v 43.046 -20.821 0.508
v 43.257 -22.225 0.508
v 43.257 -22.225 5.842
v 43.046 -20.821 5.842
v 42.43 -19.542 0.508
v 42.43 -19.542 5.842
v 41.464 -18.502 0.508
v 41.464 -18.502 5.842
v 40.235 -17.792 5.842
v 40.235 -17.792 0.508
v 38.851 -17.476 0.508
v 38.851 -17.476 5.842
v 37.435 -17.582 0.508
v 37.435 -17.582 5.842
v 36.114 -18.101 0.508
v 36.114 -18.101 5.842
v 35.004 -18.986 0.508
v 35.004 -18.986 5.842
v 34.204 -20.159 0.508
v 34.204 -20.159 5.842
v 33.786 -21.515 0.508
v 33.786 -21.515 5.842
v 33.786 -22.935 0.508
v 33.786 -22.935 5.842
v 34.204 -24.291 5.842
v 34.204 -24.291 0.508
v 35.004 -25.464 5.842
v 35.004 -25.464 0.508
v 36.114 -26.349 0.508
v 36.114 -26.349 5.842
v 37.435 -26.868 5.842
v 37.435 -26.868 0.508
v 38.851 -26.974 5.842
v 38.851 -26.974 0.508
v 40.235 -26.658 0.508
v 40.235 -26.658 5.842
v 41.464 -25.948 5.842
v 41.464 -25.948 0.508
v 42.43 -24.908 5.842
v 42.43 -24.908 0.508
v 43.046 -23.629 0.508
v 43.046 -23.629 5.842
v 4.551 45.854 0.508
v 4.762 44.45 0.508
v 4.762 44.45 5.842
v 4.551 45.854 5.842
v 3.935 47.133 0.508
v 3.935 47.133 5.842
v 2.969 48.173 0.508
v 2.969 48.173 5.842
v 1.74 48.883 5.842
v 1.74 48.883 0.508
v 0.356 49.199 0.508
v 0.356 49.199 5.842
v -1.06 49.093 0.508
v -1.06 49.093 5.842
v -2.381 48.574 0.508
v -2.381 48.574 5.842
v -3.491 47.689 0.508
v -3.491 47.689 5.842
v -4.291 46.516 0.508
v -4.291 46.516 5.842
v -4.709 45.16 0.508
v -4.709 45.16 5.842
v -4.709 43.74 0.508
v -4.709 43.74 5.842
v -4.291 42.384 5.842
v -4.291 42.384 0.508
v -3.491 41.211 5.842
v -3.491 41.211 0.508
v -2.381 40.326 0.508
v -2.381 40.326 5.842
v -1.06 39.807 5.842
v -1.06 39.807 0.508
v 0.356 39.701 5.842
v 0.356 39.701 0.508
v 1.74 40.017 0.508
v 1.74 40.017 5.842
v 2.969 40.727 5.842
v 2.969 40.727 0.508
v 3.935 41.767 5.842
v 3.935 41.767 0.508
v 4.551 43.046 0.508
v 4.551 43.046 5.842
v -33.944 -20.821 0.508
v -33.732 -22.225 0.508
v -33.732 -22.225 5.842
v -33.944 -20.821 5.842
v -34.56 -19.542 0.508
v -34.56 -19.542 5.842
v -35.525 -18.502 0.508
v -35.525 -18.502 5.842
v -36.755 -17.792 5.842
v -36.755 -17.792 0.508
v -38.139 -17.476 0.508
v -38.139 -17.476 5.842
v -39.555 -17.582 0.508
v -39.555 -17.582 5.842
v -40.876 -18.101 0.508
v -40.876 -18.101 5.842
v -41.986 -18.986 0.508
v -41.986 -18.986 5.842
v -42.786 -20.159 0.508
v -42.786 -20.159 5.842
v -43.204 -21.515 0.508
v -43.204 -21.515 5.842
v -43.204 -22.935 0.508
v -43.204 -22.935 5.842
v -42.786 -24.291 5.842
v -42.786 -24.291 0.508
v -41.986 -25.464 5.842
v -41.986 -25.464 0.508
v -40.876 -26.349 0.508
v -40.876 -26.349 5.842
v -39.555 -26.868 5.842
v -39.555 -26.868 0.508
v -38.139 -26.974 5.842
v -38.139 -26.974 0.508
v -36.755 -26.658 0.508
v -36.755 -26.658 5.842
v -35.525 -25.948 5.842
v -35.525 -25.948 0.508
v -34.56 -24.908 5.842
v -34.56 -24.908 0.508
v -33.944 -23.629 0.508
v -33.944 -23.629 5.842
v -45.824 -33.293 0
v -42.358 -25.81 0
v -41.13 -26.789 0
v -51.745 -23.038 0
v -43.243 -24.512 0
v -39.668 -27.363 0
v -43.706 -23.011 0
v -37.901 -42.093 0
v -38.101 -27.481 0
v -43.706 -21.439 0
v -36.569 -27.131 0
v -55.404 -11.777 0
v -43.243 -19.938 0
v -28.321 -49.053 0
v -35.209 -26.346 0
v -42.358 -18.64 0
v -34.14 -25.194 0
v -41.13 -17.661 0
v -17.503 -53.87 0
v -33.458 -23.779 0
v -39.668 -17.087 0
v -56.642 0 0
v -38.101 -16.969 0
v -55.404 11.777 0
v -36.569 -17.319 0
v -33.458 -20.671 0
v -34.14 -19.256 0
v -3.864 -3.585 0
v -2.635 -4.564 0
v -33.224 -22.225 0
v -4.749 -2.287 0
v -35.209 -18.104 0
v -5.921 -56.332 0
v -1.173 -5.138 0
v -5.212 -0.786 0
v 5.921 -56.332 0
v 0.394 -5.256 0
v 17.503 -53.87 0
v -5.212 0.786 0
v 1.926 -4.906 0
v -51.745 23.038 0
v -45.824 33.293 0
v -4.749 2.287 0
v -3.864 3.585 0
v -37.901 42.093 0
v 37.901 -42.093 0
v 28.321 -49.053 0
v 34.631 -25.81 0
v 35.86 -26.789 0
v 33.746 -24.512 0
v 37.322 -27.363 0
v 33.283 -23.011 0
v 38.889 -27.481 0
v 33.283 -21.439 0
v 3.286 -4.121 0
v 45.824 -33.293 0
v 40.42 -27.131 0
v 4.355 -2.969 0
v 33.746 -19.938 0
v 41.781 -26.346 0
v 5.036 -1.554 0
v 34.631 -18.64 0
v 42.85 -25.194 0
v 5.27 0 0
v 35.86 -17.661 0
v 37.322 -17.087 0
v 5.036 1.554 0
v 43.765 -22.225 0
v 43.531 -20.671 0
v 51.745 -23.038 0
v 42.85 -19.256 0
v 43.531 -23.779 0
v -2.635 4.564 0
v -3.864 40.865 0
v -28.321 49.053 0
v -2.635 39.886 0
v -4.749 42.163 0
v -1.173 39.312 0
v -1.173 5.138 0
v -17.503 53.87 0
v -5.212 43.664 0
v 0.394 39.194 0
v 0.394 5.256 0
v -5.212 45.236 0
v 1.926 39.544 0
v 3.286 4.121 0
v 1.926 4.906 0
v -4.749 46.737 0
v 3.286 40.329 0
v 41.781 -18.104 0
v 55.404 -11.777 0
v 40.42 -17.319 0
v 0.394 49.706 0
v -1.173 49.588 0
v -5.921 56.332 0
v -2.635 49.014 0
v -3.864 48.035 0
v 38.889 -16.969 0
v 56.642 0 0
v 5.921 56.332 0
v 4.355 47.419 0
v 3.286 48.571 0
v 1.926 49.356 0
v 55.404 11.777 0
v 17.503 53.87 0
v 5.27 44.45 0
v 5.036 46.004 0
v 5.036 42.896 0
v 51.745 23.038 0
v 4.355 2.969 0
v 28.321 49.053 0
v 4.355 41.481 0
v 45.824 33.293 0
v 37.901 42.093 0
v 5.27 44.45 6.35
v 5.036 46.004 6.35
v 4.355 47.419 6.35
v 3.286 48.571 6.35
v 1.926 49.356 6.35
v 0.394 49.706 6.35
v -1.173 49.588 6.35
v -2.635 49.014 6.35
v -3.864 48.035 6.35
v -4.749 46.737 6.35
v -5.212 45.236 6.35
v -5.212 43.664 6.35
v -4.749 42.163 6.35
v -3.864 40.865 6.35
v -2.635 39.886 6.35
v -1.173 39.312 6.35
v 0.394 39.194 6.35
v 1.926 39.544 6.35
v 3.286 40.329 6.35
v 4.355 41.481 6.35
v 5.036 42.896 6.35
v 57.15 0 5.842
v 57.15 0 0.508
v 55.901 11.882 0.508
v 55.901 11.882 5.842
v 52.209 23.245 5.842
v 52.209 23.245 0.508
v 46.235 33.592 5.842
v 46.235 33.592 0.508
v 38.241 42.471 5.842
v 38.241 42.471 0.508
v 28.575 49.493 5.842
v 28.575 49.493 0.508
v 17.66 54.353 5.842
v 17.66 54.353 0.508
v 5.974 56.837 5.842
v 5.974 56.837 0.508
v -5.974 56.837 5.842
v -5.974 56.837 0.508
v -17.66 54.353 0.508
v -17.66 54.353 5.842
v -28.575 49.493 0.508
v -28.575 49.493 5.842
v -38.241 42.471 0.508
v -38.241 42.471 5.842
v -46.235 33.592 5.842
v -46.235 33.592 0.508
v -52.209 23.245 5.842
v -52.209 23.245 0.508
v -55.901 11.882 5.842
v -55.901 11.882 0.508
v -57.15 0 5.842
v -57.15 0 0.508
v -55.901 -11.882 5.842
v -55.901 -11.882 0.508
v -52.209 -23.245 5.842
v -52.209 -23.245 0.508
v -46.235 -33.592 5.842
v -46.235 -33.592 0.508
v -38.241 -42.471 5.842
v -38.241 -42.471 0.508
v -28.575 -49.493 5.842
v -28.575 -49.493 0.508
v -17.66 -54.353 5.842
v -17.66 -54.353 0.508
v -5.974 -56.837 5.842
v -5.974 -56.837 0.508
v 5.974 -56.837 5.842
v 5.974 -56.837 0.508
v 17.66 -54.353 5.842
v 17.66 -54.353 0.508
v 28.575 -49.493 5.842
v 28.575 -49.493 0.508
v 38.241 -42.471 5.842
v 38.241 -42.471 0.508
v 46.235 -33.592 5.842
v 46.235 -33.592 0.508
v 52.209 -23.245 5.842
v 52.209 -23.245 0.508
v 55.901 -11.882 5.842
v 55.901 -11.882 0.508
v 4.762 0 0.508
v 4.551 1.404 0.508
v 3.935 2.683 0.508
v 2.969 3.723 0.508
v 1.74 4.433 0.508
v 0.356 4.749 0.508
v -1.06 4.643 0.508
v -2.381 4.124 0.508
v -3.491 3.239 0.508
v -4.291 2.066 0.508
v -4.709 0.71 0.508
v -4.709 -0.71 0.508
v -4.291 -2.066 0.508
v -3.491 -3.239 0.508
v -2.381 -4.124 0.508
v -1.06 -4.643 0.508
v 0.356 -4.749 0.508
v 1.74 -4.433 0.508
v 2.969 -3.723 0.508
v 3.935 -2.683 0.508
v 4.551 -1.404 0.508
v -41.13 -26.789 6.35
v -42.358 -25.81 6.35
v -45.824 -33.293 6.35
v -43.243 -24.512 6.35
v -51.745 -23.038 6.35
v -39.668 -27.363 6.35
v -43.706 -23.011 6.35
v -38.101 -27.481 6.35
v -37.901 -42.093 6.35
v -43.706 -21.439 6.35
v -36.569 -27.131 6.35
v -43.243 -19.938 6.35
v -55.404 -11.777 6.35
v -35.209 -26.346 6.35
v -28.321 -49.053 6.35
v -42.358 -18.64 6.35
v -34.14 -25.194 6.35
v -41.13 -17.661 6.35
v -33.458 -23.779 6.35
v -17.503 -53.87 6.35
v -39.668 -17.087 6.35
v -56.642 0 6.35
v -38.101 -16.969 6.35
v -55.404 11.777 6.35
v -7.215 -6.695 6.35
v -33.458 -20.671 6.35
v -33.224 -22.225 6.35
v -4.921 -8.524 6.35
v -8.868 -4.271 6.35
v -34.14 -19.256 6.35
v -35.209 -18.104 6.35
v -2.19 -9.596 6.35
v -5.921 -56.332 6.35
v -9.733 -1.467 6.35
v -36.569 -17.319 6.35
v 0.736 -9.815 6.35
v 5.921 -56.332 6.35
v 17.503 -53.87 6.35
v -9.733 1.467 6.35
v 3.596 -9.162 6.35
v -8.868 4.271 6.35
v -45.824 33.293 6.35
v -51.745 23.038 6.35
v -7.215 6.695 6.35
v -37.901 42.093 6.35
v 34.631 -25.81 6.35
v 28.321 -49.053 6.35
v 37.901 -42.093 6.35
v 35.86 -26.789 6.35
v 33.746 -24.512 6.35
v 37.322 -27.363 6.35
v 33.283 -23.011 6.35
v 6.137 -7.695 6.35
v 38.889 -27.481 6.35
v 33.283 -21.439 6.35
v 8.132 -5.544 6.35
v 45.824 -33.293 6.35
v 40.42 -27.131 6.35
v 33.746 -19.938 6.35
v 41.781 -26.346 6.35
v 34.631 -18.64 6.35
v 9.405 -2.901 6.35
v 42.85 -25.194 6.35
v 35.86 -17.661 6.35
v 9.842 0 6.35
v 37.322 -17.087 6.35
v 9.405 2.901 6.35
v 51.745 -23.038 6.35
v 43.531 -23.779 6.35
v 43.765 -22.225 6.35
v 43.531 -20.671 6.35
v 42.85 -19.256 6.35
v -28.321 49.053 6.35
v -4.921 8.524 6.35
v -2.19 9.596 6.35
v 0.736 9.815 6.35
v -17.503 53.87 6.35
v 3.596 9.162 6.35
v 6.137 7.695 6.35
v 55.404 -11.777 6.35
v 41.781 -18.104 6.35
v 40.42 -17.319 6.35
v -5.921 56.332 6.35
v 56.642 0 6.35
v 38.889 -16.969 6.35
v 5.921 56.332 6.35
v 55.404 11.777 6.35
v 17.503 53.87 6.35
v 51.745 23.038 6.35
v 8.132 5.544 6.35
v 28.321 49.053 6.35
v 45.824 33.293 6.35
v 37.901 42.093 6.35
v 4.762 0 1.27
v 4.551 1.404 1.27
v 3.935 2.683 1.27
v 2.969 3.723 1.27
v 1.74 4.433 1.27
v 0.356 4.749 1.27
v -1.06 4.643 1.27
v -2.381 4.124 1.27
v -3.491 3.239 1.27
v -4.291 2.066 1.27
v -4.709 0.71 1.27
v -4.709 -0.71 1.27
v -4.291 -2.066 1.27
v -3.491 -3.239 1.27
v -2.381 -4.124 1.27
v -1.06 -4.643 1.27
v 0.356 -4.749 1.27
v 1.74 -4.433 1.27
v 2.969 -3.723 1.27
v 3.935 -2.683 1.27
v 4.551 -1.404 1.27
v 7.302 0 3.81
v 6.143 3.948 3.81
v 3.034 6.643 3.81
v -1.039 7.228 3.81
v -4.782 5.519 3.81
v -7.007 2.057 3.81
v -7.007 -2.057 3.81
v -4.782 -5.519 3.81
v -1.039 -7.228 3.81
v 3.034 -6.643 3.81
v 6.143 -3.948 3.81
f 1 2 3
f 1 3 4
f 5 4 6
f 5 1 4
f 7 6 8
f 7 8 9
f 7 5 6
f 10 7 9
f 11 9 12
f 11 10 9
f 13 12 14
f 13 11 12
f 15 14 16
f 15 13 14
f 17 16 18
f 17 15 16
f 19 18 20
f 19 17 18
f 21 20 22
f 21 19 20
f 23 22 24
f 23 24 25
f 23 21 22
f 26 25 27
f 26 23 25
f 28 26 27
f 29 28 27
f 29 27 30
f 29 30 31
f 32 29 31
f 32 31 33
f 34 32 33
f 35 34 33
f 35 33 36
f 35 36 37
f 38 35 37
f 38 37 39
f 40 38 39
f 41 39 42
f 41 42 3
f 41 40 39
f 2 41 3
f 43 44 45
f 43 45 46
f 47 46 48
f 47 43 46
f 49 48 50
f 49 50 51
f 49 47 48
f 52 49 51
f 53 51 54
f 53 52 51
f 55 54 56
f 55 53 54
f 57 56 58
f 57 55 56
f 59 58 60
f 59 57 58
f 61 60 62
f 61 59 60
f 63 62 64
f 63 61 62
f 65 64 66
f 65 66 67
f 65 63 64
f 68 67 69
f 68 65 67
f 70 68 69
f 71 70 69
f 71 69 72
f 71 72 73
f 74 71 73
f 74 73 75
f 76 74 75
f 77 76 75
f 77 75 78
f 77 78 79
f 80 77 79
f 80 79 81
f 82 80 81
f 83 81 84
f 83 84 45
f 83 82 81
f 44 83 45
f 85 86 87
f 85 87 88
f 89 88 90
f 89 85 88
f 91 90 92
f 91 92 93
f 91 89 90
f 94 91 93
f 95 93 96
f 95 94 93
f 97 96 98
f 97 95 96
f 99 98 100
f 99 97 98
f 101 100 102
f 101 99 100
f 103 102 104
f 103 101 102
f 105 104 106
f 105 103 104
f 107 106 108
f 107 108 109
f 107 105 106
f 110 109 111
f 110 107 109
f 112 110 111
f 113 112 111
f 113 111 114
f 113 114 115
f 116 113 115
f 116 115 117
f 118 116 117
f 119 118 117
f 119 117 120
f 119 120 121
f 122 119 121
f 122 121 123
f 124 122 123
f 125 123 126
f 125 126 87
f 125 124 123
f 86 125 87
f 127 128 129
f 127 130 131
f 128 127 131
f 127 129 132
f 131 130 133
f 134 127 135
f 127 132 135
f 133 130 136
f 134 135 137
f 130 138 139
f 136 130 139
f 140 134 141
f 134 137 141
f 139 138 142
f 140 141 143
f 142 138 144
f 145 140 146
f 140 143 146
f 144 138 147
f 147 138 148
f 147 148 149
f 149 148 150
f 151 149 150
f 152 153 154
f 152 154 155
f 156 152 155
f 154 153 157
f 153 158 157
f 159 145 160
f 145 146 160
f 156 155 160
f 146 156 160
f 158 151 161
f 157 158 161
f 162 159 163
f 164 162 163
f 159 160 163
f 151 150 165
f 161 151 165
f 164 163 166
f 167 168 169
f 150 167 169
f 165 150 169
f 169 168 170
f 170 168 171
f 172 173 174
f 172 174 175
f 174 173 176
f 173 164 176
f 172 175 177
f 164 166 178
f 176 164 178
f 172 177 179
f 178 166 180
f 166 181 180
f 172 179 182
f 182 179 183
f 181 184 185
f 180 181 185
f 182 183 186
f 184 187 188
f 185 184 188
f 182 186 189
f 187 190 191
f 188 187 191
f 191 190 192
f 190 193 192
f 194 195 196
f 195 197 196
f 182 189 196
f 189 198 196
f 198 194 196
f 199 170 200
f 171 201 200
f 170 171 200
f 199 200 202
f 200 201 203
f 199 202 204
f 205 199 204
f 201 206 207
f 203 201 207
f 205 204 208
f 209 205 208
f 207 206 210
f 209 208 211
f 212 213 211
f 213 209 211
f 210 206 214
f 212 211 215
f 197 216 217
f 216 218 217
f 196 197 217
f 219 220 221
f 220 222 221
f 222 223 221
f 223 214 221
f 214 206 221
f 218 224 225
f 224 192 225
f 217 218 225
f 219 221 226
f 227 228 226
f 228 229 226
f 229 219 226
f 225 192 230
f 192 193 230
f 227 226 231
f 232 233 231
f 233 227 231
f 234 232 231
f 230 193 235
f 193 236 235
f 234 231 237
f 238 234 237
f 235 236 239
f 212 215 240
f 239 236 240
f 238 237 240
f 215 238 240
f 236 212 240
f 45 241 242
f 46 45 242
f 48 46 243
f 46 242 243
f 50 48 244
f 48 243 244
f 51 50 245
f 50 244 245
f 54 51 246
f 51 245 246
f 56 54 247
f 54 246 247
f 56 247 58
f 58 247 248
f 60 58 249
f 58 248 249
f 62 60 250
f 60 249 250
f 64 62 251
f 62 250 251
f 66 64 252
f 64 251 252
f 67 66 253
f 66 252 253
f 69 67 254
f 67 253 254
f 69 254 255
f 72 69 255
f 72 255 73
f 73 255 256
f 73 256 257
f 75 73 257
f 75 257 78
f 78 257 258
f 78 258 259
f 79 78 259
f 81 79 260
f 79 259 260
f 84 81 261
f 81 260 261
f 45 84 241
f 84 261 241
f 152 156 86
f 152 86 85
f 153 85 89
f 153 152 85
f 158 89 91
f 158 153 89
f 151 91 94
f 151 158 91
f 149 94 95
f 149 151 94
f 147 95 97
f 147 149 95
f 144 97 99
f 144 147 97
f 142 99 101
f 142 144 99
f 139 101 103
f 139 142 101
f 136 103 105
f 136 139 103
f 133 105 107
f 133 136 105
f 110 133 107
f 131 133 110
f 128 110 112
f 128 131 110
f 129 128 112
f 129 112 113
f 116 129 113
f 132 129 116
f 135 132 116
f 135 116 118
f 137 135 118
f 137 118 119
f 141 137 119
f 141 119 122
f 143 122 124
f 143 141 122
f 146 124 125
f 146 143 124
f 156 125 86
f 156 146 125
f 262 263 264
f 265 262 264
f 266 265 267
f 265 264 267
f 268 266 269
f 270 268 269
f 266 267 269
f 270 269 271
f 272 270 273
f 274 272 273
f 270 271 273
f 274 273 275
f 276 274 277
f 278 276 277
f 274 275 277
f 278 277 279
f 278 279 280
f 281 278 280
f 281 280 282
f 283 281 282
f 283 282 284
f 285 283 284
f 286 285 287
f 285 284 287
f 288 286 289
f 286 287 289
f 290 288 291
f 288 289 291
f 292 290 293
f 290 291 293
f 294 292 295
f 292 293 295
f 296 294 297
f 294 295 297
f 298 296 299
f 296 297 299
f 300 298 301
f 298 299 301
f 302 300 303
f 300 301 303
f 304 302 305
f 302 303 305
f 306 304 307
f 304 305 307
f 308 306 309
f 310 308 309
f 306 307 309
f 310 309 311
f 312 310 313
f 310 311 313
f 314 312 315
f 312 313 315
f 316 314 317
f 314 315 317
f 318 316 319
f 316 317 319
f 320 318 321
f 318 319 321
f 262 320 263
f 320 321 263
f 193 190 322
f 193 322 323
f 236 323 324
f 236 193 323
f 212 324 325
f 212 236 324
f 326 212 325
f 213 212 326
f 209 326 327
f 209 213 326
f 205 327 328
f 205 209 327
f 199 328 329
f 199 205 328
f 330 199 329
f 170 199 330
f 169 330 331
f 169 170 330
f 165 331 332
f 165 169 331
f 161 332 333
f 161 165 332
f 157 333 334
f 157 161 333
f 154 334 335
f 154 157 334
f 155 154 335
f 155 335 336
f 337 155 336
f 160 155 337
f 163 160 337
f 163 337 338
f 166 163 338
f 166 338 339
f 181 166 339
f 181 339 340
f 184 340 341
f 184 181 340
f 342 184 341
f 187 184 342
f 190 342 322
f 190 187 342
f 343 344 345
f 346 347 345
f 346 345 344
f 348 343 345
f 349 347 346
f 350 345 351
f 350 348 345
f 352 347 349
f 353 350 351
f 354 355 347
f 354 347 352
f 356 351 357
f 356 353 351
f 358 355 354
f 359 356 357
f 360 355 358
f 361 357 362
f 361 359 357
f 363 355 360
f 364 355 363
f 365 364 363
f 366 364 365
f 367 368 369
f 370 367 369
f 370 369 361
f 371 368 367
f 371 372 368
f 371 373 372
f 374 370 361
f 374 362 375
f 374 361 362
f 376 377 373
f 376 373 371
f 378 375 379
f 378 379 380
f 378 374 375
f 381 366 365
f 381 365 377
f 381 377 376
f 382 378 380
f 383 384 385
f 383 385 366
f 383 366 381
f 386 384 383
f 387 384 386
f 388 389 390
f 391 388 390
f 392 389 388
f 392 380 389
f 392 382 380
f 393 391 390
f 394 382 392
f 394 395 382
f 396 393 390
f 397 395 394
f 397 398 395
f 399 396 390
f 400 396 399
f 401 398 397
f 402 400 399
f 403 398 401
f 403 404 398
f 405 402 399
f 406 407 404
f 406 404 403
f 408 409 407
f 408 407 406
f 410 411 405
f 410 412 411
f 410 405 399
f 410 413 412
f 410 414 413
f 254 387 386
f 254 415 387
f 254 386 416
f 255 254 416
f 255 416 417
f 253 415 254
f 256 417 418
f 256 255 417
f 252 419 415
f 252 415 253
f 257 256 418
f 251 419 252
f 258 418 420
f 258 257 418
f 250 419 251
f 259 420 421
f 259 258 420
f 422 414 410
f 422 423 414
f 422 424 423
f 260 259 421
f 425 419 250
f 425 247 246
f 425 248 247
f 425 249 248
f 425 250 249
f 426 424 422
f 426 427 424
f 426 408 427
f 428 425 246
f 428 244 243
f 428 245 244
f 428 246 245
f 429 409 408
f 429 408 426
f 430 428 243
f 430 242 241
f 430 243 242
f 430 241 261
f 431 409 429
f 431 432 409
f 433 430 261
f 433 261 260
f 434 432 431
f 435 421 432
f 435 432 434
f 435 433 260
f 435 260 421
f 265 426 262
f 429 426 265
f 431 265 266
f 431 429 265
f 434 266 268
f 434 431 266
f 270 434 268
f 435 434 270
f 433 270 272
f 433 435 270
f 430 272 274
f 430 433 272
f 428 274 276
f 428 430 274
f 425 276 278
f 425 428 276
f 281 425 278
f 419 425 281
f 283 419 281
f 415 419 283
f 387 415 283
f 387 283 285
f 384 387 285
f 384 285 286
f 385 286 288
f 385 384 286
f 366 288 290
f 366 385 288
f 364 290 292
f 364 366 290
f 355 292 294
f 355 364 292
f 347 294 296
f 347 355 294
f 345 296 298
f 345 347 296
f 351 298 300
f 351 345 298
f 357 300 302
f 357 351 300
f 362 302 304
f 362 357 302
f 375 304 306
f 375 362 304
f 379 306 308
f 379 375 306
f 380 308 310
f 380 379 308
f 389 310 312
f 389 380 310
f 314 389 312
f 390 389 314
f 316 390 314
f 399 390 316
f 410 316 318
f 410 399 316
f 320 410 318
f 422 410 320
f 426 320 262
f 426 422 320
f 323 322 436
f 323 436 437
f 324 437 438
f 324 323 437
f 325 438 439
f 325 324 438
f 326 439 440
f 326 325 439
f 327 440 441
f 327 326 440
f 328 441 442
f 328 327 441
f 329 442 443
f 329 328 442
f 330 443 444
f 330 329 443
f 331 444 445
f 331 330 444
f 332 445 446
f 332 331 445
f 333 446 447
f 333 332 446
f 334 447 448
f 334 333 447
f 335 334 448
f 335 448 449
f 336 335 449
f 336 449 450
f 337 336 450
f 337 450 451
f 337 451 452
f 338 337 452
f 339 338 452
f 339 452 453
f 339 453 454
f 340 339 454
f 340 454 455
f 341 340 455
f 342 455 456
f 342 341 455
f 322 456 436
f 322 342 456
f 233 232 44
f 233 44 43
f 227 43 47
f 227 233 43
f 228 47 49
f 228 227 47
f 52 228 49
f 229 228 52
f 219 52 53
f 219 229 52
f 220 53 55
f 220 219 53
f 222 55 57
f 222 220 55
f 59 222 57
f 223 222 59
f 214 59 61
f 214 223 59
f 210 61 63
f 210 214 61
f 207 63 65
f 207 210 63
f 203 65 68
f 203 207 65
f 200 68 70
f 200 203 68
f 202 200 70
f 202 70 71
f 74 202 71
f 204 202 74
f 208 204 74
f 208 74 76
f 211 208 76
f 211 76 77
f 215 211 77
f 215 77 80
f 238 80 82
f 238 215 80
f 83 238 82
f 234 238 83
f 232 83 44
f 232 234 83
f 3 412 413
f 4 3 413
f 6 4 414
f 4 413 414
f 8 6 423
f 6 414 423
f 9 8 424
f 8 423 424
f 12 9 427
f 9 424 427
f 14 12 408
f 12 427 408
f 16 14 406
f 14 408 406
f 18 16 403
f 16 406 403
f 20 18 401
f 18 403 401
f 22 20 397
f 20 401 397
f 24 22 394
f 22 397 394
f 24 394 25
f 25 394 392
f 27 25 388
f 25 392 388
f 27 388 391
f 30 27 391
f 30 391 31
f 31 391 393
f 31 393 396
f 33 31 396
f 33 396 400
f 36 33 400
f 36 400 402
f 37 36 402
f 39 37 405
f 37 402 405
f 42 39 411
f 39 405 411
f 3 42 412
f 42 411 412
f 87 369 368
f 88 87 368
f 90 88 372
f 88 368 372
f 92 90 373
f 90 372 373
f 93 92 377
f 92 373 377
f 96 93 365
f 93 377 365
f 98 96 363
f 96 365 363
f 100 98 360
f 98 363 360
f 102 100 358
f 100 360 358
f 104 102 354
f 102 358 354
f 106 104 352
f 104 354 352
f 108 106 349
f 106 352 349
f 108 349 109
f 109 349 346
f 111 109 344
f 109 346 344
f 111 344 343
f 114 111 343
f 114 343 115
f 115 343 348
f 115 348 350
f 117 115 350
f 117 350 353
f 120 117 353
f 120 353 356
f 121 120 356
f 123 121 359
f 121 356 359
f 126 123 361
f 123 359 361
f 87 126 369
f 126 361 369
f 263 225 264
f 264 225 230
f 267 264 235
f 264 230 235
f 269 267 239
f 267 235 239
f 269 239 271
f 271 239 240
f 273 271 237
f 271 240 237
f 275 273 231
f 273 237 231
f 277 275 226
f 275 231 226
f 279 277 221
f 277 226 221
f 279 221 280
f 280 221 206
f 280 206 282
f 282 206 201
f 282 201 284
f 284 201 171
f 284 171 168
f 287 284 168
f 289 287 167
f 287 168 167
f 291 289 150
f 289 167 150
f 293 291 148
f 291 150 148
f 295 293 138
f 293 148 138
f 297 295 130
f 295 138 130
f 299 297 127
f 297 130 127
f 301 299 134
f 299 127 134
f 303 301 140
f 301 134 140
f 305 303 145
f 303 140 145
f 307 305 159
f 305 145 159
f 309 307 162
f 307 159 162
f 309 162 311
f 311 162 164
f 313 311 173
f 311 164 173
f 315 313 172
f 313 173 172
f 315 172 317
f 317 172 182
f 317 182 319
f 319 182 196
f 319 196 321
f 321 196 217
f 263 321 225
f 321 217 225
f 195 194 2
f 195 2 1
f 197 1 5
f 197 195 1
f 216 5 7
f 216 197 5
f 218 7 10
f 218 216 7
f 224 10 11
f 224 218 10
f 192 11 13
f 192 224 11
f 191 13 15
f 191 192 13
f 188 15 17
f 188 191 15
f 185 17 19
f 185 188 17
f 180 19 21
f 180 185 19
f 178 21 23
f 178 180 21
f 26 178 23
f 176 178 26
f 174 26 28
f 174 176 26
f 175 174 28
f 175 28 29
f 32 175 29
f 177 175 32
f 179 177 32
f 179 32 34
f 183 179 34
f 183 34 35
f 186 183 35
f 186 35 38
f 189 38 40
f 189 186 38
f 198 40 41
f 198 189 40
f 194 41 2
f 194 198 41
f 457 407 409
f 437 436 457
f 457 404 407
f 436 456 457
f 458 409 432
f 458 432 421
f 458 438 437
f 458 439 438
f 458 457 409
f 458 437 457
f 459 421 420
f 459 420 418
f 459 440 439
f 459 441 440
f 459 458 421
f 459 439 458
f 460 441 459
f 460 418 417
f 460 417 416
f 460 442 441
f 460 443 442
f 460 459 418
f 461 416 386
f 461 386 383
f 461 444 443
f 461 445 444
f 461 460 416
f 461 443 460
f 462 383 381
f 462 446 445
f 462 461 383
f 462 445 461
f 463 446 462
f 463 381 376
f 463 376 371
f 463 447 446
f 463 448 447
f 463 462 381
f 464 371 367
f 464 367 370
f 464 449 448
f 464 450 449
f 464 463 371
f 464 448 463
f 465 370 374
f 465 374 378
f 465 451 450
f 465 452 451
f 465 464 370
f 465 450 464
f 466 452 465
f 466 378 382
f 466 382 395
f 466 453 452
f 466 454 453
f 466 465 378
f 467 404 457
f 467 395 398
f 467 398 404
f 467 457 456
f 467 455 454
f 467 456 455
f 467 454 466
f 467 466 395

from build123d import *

# Parameters (mm, degrees)
F0_R     = 57.15
F0_R_2   = 4.7625
F1_DEPTH = 6.35
F2_SIZE  = 0.508
F3_SIZE  = 5.08


with BuildPart() as f1:
    # F0 (on Top) → F1 (new body)
    with BuildSketch(Plane.XY):
        Circle(F0_R)
        with Locations((-38.494829, -22.225)):
            Circle(F0_R_2, mode=Mode.SUBTRACT)
        with Locations((38.494829, -22.225)):
            Circle(F0_R_2, mode=Mode.SUBTRACT)
        Circle(F0_R_2, mode=Mode.SUBTRACT)
        with Locations((0, 44.45)):
            Circle(F0_R_2, mode=Mode.SUBTRACT)
    extrude(amount=F1_DEPTH)

    # F2
    f2_edges = [f1.edges().sort_by_distance(p)[0] for p in [
        (-57.15, 0, 6.35),
        (-4.7625, 44.45, 6.35),
        (-43.257329, -22.225, 6.35),
        (33.732329, -22.225, 6.35),
        (-57.15, 0, 0),
        (-4.7625, 44.45, 0),
        (33.732329, -22.225, 0),
        (-43.257329, -22.225, 0),
        (-4.7625, 0, 0),
    ]]
    chamfer(f2_edges, length=F2_SIZE)

    # F3
    f3_edges = [f1.edges().sort_by_distance(p)[0] for p in [
        (-4.7625, 0, 6.35),
    ]]
    chamfer(f3_edges, length=F3_SIZE)


solid = f1.part
